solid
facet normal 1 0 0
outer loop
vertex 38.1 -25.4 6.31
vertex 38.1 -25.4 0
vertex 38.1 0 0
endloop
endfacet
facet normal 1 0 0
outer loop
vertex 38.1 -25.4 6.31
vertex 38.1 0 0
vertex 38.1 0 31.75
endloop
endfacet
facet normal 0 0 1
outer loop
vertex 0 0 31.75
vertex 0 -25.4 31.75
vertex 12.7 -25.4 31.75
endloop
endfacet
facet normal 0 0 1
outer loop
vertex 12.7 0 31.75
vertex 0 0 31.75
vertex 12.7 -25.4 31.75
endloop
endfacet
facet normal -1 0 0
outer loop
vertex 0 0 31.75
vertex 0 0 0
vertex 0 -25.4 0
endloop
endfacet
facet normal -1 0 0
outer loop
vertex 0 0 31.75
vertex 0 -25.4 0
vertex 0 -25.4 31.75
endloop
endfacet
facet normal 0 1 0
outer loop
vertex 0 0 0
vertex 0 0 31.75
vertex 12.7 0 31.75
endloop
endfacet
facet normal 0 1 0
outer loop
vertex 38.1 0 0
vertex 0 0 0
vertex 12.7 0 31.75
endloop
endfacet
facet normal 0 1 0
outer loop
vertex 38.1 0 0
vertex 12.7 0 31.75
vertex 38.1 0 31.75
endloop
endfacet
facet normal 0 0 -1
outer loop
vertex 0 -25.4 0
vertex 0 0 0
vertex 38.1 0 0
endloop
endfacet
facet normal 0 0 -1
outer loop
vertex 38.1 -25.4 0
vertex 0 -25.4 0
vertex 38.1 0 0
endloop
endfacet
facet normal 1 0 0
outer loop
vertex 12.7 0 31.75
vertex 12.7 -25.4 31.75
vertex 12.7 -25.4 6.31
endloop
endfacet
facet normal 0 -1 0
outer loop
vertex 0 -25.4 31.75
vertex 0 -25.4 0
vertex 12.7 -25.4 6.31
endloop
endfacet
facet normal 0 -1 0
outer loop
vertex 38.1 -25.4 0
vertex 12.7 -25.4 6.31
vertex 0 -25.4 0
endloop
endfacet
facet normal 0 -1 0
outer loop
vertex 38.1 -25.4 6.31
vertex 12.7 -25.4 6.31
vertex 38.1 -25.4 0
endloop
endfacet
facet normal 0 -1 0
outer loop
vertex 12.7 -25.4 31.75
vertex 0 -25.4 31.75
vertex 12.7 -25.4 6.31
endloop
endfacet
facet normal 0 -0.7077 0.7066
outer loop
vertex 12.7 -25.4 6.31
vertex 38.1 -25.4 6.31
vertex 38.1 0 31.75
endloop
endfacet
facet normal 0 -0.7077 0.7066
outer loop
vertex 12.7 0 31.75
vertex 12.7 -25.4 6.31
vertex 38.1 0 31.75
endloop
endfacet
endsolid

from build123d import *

# Parameters (mm, degrees)
F0_W     = 38.1
F0_H     = 31.75
F1_DEPTH = 25.4
F3_DEPTH = 25.4


with BuildPart() as f1:
    # F0 (on Front) → F1 (new body)
    with BuildSketch(Plane.XZ):
        with Locations((19.05, 15.875)):
            Rectangle(F0_W, F0_H)
    extrude(amount=F1_DEPTH)

    # F2 (on face) → F3 (cut)
    with BuildSketch(Plane.YZ.offset(38.1)):
        Polygon((-25.4, 6.309687), (0, 31.75), (-8.660507, 31.75), (-25.4, 31.75), align=None)
    extrude(amount=-F3_DEPTH, mode=Mode.SUBTRACT)


solid = f1.part
